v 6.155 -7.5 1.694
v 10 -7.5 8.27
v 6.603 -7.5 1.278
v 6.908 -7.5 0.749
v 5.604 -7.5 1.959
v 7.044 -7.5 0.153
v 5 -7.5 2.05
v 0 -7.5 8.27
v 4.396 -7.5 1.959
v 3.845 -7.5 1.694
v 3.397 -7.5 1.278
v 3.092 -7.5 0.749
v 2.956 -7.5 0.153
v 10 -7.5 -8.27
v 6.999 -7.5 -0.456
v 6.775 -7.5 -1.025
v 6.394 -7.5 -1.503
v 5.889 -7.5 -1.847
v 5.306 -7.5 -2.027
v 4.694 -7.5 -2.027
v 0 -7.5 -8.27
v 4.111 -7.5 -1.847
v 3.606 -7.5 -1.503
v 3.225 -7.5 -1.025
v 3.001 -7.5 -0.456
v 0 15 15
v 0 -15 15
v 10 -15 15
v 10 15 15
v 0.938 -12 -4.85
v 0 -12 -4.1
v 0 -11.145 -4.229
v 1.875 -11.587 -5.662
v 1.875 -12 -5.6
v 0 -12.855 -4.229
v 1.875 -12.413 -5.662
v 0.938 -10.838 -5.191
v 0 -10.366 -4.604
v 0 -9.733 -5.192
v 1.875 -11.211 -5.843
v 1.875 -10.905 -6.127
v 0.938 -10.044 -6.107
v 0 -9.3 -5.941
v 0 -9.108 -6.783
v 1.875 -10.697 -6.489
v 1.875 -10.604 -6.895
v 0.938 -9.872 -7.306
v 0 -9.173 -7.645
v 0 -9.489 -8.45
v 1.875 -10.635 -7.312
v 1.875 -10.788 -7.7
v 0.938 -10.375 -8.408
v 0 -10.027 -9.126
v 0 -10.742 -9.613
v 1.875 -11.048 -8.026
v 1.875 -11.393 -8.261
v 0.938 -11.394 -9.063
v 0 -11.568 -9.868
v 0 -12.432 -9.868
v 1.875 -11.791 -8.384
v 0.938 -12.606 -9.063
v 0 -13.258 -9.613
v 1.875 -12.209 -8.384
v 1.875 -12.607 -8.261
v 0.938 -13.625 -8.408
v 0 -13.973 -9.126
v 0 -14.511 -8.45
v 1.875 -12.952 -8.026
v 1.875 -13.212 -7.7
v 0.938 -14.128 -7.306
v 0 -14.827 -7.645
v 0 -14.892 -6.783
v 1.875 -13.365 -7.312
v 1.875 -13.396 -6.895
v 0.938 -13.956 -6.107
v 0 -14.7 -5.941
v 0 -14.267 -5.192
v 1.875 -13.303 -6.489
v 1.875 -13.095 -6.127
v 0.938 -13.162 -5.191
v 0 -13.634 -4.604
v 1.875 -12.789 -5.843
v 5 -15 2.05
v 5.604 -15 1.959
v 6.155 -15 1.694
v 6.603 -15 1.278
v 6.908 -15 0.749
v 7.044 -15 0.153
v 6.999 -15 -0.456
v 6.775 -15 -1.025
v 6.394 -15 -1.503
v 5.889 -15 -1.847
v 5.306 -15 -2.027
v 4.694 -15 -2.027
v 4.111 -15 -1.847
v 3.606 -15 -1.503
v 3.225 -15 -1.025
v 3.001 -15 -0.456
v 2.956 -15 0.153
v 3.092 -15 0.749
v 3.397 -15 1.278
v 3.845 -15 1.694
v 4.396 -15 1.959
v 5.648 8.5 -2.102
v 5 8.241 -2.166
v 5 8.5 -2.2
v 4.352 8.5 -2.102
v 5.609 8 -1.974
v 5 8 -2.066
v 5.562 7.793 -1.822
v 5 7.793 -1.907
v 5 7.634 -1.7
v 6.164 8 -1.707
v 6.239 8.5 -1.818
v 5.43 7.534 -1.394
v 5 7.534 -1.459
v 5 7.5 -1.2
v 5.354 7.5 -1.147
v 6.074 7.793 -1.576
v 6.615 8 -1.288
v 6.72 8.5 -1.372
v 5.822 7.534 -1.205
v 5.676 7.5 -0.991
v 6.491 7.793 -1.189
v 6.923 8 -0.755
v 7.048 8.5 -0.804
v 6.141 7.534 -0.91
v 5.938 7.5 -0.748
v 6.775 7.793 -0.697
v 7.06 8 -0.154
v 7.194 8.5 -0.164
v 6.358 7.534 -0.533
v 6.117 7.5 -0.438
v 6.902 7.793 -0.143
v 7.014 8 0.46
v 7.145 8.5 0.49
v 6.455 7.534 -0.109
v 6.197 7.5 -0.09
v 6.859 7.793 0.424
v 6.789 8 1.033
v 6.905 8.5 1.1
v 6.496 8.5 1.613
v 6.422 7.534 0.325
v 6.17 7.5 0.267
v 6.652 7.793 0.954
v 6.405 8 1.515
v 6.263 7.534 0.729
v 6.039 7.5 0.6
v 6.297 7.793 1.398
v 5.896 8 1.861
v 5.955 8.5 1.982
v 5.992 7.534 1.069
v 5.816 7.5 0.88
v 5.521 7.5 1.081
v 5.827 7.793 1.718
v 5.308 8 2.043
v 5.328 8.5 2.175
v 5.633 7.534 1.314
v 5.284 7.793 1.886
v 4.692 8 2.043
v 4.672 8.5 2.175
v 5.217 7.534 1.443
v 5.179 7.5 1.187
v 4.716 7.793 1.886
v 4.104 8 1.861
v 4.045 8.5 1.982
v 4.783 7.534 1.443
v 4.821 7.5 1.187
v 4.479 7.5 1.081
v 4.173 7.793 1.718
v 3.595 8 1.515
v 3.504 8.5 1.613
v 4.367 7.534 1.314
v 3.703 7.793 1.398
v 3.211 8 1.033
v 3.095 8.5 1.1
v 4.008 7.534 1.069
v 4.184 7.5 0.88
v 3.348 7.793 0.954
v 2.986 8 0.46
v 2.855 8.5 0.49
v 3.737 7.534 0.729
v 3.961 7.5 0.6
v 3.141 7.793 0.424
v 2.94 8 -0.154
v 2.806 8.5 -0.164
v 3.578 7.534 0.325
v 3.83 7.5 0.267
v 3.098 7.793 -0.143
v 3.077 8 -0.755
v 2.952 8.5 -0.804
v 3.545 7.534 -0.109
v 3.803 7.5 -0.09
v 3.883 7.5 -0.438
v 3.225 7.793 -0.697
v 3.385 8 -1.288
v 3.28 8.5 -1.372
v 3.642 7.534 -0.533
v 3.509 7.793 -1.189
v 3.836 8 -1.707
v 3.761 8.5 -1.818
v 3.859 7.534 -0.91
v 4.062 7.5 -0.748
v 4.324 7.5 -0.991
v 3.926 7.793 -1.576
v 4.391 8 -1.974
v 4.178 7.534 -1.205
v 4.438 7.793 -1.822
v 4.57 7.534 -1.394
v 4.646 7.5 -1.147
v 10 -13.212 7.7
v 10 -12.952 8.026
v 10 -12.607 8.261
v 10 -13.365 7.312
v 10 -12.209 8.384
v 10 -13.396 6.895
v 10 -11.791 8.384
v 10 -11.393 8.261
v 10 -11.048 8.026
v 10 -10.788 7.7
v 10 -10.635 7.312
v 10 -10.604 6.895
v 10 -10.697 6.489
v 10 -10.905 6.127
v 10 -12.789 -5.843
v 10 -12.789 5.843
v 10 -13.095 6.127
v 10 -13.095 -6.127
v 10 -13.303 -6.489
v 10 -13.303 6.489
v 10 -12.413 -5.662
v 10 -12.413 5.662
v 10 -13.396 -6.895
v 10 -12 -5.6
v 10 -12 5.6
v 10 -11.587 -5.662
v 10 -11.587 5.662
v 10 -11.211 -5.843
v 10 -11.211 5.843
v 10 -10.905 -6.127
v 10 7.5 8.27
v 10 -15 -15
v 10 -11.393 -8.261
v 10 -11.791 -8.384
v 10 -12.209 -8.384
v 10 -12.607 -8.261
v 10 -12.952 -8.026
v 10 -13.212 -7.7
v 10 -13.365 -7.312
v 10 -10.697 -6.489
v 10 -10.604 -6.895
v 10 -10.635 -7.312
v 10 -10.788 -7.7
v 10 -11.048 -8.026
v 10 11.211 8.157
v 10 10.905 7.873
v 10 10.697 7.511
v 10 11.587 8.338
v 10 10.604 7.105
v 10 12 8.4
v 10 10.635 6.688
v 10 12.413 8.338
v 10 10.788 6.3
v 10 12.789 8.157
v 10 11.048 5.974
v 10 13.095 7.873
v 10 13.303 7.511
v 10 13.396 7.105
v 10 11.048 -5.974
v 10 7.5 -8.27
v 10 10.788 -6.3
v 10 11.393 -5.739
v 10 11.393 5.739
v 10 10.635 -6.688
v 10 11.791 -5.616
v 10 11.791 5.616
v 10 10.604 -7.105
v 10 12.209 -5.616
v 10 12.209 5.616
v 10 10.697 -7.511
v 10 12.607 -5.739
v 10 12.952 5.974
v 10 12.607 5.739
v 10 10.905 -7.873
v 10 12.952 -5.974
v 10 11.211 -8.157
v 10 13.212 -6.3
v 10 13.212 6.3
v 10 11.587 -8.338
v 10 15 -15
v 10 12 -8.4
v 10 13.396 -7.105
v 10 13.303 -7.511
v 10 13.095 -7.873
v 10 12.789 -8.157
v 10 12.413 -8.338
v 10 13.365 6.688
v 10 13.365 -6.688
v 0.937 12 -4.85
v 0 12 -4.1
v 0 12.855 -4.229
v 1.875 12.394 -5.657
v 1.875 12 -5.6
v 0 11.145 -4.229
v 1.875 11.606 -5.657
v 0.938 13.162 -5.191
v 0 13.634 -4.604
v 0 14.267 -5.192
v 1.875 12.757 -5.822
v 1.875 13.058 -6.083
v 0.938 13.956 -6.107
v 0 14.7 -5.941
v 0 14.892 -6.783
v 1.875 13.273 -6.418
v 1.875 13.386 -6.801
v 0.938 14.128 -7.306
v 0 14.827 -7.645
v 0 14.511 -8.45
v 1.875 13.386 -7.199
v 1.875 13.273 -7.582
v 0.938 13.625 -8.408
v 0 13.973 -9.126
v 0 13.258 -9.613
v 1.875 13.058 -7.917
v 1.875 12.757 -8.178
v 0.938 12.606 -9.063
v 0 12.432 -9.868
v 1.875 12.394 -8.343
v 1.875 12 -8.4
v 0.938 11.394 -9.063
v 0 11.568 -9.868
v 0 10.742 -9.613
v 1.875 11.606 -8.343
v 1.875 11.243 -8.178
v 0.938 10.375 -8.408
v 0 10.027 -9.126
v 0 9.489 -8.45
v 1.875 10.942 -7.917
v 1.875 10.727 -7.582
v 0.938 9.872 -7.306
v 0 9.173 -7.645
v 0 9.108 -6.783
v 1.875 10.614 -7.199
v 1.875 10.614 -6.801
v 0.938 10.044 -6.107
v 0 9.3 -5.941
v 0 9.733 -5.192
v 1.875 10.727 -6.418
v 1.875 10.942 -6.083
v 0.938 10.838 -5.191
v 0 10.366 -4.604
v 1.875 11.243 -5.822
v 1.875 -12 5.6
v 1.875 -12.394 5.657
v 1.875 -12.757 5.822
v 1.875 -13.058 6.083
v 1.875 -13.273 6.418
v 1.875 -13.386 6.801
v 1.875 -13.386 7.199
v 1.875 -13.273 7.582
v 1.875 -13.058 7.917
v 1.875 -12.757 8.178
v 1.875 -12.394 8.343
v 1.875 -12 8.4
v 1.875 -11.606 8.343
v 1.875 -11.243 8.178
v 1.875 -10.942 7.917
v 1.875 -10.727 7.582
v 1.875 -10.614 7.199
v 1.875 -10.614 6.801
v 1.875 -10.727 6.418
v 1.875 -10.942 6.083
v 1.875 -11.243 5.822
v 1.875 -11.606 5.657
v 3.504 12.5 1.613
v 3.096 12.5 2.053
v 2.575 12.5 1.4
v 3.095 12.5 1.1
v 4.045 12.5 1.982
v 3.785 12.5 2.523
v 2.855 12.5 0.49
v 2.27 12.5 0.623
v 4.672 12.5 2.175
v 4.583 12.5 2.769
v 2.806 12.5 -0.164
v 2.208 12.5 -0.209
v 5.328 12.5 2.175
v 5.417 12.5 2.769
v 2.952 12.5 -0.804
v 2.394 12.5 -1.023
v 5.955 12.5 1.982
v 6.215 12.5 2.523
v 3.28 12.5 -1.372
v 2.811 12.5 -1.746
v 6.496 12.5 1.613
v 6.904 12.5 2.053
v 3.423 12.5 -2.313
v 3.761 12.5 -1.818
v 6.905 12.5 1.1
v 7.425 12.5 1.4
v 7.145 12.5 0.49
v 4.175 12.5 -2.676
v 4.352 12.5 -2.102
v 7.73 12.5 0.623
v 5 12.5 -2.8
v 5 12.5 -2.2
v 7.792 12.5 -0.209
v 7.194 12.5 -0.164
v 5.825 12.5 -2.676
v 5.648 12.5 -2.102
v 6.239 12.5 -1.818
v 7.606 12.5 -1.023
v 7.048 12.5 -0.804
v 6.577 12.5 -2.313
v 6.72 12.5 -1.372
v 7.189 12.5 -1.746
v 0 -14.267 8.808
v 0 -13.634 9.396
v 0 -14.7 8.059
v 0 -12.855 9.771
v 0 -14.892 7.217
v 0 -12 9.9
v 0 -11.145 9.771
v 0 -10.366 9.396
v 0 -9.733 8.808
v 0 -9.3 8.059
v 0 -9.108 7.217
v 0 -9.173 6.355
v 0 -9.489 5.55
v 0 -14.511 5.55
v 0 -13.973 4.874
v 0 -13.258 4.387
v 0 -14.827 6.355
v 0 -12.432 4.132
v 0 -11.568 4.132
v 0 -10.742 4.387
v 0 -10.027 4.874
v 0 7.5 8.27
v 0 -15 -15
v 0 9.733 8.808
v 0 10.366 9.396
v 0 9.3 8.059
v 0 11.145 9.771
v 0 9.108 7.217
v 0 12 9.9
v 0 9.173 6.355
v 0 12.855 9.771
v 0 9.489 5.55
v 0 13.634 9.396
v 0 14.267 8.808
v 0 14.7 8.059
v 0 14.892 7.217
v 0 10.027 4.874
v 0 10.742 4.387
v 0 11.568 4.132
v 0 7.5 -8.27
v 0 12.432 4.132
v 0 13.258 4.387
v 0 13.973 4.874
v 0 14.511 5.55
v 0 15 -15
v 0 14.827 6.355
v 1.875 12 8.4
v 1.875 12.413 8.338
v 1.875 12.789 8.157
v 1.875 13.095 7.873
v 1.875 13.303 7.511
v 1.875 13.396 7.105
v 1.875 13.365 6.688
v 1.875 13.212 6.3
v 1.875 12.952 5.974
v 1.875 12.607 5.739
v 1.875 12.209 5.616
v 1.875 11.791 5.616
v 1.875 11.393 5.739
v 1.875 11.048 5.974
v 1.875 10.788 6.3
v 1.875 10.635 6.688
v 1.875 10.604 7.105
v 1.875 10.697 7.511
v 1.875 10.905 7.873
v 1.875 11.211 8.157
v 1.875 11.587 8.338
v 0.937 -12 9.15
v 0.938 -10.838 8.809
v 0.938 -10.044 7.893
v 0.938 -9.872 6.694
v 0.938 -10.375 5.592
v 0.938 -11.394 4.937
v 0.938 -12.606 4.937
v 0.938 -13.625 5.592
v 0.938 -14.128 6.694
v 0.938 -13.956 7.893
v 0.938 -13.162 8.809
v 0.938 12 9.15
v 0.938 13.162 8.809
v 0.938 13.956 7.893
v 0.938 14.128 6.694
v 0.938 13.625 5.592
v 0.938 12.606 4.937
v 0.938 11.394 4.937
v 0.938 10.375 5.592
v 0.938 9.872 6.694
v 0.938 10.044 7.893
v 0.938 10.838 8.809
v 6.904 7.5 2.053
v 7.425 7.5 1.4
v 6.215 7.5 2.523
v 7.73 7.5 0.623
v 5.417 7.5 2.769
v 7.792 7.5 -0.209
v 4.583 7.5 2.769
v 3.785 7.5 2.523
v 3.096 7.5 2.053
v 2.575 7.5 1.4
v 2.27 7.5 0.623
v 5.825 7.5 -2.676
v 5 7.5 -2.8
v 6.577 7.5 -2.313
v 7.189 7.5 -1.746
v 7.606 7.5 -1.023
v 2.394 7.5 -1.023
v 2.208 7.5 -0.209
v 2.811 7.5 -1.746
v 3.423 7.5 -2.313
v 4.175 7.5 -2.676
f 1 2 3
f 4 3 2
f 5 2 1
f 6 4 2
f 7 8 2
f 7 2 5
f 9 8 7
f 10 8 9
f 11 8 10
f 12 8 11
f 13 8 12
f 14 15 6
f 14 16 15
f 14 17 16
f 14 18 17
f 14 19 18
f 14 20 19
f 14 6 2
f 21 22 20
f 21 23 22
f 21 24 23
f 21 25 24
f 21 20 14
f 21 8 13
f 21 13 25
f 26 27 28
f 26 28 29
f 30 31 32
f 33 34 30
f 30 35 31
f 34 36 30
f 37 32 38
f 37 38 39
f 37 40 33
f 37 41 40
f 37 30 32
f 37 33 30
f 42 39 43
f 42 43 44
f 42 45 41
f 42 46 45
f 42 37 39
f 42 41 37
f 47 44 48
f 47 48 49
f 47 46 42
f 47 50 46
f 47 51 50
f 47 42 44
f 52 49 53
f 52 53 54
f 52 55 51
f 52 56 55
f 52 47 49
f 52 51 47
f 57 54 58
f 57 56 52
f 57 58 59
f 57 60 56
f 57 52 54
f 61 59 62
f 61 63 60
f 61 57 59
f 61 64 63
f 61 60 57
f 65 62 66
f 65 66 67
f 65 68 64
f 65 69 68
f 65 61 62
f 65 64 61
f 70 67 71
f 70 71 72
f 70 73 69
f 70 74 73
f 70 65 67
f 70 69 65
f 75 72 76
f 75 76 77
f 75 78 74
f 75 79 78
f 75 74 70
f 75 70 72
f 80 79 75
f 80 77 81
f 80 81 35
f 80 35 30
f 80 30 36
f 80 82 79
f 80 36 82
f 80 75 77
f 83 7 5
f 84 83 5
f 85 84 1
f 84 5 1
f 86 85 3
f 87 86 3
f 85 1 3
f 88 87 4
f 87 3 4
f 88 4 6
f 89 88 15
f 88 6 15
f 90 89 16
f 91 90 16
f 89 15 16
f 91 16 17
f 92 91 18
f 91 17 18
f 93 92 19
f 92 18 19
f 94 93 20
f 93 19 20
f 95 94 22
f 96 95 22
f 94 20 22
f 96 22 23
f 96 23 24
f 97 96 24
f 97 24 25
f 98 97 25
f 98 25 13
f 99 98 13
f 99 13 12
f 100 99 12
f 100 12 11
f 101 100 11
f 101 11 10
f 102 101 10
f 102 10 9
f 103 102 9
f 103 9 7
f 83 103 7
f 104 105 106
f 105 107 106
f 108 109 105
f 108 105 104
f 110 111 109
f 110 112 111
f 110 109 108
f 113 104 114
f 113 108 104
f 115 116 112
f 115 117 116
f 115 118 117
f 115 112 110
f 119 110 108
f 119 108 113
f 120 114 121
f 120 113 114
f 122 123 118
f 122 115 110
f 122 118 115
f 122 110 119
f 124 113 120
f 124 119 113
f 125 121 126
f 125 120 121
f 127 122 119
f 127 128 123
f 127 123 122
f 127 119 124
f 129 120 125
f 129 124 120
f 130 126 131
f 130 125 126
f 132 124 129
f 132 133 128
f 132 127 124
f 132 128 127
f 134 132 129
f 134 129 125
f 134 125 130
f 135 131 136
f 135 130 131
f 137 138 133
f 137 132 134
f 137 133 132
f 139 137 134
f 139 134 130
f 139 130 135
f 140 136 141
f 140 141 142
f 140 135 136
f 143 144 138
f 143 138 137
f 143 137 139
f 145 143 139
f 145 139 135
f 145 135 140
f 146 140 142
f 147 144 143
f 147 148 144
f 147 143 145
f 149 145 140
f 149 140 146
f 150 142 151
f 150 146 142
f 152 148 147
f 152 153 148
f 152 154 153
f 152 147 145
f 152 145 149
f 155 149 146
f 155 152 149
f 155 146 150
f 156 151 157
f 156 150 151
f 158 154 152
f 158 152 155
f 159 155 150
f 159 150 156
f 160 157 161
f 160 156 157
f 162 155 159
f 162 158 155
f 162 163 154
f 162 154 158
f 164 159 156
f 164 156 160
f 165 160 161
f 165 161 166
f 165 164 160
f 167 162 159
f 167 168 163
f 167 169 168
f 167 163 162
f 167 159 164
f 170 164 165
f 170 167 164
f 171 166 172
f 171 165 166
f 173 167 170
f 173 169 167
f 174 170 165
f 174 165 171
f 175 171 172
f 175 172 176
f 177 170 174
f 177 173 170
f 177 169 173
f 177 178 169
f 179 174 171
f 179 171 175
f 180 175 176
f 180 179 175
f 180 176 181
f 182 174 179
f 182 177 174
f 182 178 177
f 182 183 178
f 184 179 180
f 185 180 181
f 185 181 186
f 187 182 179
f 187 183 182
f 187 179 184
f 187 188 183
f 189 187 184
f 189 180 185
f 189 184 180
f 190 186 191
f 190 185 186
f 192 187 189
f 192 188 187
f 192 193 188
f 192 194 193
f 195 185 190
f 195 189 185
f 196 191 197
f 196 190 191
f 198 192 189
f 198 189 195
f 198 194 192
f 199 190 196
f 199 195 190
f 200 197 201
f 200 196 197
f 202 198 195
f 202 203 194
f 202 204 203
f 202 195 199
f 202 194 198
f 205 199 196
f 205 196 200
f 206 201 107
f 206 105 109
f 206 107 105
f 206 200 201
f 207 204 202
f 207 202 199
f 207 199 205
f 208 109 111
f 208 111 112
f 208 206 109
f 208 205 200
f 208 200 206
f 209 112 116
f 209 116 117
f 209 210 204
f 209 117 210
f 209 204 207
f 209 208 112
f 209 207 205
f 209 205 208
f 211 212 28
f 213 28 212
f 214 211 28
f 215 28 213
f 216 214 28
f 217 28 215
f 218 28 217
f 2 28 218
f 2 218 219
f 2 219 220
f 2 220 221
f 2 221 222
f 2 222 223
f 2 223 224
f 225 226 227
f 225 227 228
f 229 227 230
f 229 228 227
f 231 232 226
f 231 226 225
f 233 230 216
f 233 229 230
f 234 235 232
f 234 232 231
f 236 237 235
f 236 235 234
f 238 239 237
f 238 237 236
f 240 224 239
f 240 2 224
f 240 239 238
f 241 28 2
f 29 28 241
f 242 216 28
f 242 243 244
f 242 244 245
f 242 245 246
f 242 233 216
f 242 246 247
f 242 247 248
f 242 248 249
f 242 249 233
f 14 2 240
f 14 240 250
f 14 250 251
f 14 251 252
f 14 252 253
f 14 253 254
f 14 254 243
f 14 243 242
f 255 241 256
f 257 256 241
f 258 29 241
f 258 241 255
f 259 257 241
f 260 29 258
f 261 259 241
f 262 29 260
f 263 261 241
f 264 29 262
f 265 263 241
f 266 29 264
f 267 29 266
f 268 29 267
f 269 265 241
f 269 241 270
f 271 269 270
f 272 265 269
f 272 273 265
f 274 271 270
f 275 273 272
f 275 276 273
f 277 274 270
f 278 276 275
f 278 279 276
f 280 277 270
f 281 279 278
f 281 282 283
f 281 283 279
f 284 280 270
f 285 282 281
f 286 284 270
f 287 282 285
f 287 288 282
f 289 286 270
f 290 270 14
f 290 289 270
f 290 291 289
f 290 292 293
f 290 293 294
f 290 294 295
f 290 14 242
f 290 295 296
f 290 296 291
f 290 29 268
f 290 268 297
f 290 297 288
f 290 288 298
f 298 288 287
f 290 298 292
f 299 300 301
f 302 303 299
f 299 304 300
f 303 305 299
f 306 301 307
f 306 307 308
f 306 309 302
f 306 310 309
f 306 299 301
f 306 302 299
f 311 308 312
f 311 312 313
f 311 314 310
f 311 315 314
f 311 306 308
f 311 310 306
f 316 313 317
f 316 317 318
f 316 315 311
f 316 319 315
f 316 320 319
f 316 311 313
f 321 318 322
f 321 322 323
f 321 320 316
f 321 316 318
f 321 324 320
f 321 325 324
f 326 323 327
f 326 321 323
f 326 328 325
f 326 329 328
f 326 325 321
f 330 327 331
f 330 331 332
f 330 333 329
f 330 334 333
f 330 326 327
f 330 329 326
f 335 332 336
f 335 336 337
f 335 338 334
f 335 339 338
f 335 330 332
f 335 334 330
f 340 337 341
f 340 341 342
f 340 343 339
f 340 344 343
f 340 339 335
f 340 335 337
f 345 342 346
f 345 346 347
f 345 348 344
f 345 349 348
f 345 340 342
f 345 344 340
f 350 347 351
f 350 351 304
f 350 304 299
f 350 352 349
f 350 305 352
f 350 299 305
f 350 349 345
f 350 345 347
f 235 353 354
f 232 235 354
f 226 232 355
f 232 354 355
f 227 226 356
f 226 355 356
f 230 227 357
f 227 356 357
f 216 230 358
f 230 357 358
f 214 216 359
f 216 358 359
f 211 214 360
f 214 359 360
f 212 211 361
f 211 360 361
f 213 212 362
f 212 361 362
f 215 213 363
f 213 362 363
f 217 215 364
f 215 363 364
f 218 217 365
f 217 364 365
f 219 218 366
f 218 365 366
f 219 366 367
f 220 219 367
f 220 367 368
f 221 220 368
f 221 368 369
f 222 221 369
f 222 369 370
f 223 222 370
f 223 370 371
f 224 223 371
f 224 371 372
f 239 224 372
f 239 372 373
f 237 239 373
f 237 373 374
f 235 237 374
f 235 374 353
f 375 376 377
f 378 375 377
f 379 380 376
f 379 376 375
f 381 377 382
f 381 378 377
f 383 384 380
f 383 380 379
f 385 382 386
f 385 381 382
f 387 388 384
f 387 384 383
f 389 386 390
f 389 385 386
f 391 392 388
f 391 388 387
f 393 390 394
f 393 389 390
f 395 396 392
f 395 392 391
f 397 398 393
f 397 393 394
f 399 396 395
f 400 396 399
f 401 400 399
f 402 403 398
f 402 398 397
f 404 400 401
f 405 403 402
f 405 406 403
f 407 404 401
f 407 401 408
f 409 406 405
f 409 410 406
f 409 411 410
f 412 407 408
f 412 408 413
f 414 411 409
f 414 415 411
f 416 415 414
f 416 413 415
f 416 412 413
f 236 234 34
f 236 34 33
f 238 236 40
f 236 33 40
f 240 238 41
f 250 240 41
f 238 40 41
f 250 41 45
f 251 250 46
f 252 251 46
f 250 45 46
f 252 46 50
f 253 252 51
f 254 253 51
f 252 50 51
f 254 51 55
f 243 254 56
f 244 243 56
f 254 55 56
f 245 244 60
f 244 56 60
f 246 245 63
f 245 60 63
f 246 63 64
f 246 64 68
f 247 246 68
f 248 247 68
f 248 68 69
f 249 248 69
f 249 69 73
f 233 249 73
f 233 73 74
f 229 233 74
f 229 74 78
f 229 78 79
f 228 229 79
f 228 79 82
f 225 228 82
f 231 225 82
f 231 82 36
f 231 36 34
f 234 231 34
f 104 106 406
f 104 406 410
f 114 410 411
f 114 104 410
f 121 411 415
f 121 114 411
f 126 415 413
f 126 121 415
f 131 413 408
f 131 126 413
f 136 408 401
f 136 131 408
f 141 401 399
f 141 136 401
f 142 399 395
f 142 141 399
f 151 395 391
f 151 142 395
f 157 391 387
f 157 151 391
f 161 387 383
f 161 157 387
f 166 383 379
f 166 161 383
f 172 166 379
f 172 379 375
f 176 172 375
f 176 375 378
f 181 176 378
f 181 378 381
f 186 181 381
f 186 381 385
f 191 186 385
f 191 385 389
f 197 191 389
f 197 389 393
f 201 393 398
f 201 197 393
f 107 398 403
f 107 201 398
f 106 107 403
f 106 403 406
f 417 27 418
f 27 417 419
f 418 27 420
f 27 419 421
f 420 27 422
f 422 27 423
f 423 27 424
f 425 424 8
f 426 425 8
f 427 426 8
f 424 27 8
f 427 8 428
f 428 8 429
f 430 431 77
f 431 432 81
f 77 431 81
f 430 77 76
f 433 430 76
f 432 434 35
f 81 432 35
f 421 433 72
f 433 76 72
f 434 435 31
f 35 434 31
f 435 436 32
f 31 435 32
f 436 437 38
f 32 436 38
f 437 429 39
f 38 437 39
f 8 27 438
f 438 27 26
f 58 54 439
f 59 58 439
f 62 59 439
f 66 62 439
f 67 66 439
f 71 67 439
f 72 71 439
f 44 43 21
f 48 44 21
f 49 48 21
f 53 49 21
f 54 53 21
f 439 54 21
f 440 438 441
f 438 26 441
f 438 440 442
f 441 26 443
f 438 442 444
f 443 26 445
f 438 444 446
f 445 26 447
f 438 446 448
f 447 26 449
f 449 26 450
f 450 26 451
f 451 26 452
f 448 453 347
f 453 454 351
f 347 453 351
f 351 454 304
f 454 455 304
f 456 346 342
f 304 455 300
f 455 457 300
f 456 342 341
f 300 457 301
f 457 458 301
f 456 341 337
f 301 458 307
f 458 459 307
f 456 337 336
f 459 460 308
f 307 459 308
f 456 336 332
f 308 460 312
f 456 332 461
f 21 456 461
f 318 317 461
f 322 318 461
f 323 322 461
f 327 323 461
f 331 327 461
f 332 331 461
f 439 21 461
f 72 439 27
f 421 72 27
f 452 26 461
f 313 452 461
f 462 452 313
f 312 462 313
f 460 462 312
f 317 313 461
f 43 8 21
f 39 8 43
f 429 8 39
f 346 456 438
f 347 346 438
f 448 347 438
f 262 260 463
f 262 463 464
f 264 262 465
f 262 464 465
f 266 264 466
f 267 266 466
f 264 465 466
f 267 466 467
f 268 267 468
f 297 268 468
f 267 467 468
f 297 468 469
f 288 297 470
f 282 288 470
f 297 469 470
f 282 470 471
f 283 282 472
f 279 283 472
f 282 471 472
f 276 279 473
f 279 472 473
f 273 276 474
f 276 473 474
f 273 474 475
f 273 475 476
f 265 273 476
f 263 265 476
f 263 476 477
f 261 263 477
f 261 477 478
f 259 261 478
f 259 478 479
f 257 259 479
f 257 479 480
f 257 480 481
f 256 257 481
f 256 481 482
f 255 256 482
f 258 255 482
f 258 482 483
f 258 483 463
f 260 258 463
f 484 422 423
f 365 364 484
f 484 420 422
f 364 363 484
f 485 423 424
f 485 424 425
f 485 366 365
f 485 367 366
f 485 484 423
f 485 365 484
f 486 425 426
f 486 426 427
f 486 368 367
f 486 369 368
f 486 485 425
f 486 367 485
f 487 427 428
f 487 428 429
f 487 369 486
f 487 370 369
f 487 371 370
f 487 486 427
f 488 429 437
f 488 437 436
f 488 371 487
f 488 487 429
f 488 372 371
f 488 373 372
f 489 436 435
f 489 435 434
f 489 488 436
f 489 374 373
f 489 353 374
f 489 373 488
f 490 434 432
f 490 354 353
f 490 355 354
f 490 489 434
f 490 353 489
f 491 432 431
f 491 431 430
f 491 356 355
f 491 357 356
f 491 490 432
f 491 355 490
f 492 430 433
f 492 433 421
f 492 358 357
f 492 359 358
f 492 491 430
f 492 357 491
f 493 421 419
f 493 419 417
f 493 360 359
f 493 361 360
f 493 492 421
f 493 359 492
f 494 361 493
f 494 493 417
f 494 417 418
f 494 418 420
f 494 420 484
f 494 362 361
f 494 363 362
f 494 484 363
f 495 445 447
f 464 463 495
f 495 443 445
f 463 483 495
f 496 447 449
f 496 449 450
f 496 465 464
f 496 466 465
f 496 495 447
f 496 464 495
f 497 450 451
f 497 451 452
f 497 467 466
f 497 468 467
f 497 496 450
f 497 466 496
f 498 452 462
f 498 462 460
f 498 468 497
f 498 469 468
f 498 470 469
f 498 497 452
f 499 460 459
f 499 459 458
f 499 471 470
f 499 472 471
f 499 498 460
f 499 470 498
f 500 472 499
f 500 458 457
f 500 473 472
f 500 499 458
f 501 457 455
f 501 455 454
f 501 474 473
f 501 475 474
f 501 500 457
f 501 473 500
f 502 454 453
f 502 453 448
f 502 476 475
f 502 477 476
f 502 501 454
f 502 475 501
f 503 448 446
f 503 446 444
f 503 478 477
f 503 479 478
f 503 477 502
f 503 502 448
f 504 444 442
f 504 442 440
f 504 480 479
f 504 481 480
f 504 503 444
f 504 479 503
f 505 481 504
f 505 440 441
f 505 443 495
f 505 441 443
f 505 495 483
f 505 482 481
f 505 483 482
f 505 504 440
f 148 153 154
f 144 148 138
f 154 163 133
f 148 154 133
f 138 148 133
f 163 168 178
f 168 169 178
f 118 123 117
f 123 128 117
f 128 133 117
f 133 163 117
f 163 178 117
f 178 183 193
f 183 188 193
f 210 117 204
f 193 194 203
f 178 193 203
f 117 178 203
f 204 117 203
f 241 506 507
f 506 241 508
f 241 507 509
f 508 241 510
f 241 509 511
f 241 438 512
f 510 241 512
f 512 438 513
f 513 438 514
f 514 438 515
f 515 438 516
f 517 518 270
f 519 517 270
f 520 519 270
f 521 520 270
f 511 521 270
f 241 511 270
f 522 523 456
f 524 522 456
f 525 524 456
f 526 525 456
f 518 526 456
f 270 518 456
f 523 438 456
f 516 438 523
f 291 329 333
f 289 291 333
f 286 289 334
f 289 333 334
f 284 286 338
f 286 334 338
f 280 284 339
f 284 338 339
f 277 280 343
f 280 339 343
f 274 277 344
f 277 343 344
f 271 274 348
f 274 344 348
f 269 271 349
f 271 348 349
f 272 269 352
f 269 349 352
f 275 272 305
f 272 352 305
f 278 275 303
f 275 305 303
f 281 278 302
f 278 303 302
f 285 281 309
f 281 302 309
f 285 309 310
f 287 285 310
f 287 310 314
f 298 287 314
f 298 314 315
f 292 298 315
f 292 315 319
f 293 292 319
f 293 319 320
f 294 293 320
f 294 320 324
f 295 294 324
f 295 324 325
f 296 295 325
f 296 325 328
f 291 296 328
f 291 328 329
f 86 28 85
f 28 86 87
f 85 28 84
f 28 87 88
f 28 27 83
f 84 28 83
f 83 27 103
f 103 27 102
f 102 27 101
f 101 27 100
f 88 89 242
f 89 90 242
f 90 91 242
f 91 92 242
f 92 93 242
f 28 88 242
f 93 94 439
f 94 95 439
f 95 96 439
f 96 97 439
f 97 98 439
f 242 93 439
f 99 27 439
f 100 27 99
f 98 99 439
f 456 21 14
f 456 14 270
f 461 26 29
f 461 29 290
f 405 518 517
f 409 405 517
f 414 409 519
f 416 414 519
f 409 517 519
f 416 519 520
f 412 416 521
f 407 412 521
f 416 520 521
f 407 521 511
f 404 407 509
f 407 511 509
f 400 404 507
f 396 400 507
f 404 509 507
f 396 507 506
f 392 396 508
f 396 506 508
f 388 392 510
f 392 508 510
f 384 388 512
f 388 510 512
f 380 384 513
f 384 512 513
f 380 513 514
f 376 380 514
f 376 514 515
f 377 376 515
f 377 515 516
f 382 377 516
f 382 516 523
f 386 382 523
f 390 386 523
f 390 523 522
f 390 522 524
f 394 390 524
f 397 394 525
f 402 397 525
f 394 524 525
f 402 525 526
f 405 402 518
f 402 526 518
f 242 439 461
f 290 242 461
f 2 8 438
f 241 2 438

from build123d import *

# Parameters (mm, degrees)
SKETCH_1_W          = 30
SKETCH_1_H          = 30
SKETCH_1_W_2        = 16.540501684
SKETCH_1_H_2        = 15
EXTRUDE_1_DEPTH     = 10
SKETCH_4_R          = 1.4
CUT_EXTRUDE_3_DEPTH = 24.452078799
SKETCH_8_R          = 2.9
CUT_EXTRUDE_6_DEPTH = 2
CHAMFER_1_SIZE      = 2
CHAMFER_1_SIZE_2    = 1.6
SKETCH_5_R          = 2.05
CUT_EXTRUDE_7_DEPTH = 20
SKETCH_9_R          = 2.8
SKETCH_9_R_2        = 2.2
CUT_EXTRUDE_8_DEPTH = 5
FILLET_1_R          = 1


with BuildPart() as part:
    # 스케치1 → 보스-돌출1 (new body)
    with BuildSketch(Plane(origin=(0, 0, 0), x_dir=(0, 0, -1), z_dir=(1, 0, 0))):
        Rectangle(SKETCH_1_W, SKETCH_1_H)
        Rectangle(SKETCH_1_W_2, SKETCH_1_H_2, mode=Mode.SUBTRACT)
    extrude(amount=EXTRUDE_1_DEPTH)

    # 스케치4 → 컷-돌출3 (cut, through all)
    with BuildSketch(Plane(origin=(0, 0, 0), x_dir=(0, 0, -1), z_dir=(1, 0, 0))):
        with Locations((-7, -12)):
            Circle(SKETCH_4_R)
        with Locations(Location((-7, 12, 0), (0, 0, 180))):
            Circle(SKETCH_4_R)
        with Locations(Location((7, -12, 0), (0, 0, 180))):
            Circle(SKETCH_4_R)
        with Locations((7, 12)):
            Circle(SKETCH_4_R)
    extrude(amount=CUT_EXTRUDE_3_DEPTH, mode=Mode.SUBTRACT)

    # 스케치8 → 컷-돌출6 (cut)
    with BuildSketch(Plane.ZY):
        with Locations((-7, 12)):
            Circle(SKETCH_8_R)
        with Locations((7, 12)):
            Circle(SKETCH_8_R)
        with Locations((-7, -12)):
            Circle(SKETCH_8_R)
        with Locations((7, -12)):
            Circle(SKETCH_8_R)
    extrude(amount=-CUT_EXTRUDE_6_DEPTH, mode=Mode.SUBTRACT)

    # 모따기1
    # the kernel refuses this chamfer: 2, 1.6 mm, written as the material it adds along each edge
    with BuildSketch(Plane(origin=(2, -12, 7), x_dir=(0, 0, 1), z_dir=(0, -1, 0))) as chamfer_1_piece_1_section:
        Polygon((2.9, CHAMFER_1_SIZE), (2.9 - CHAMFER_1_SIZE_2, 0), (2.9, 0), align=None)
    chamfer_1_piece_1 = revolve(axis=Axis((2, -12, 7), (-1, 0, 0)), mode=Mode.PRIVATE)
    chamfer_1_piece_1 = split(chamfer_1_piece_1, bisect_by=Plane(origin=(0, -12, 4.826759692), z_dir=(1, 0, 0)), keep=Keep.TOP, mode=Mode.PRIVATE)
    chamfer_1_piece_1 = chamfer_1_piece_1 - Plane(origin=(0.956092246, -12, 7), x_dir=(0, 0, -1), z_dir=(-1, 0, 0)) * Cylinder(1.4, 12, mode=Mode.PRIVATE)
    add(chamfer_1_piece_1)
    with BuildSketch(Plane(origin=(2, 12, 7), x_dir=(0, 0, 1), z_dir=(0, -1, 0))) as chamfer_1_piece_2_section:
        Polygon((2.9, CHAMFER_1_SIZE), (2.9 - CHAMFER_1_SIZE_2, 0), (2.9, 0), align=None)
    chamfer_1_piece_2 = revolve(axis=Axis((2, 12, 7), (-1, 0, 0)), mode=Mode.PRIVATE)
    chamfer_1_piece_2 = split(chamfer_1_piece_2, bisect_by=Plane(origin=(0, 12, 4.826759692), z_dir=(1, 0, 0)), keep=Keep.TOP, mode=Mode.PRIVATE)
    chamfer_1_piece_2 = chamfer_1_piece_2 - Plane(origin=(0.956092246, 12, 7), x_dir=(0, 0, 1), z_dir=(-1, 0, 0)) * Cylinder(1.4, 12, mode=Mode.PRIVATE)
    add(chamfer_1_piece_2)
    with BuildSketch(Plane(origin=(2, 12, -7), x_dir=(0, 0, 1), z_dir=(0, -1, 0))) as chamfer_1_piece_3_section:
        Polygon((2.9, CHAMFER_1_SIZE), (2.9 - CHAMFER_1_SIZE_2, 0), (2.9, 0), align=None)
    chamfer_1_piece_3 = revolve(axis=Axis((2, 12, -7), (-1, 0, 0)), mode=Mode.PRIVATE)
    chamfer_1_piece_3 = split(chamfer_1_piece_3, bisect_by=Plane(origin=(0, 12, -9.173240308), z_dir=(1, 0, 0)), keep=Keep.TOP, mode=Mode.PRIVATE)
    chamfer_1_piece_3 = chamfer_1_piece_3 - Plane(origin=(0.956092246, 12, -7), x_dir=(0, 0, -1), z_dir=(-1, 0, 0)) * Cylinder(1.4, 12, mode=Mode.PRIVATE)
    add(chamfer_1_piece_3)
    with BuildSketch(Plane(origin=(2, -12, -7), x_dir=(0, 0, 1), z_dir=(0, -1, 0))) as chamfer_1_piece_4_section:
        Polygon((2.9, CHAMFER_1_SIZE), (2.9 - CHAMFER_1_SIZE_2, 0), (2.9, 0), align=None)
    chamfer_1_piece_4 = revolve(axis=Axis((2, -12, -7), (-1, 0, 0)), mode=Mode.PRIVATE)
    chamfer_1_piece_4 = split(chamfer_1_piece_4, bisect_by=Plane(origin=(0, -12, -9.173240308), z_dir=(1, 0, 0)), keep=Keep.TOP, mode=Mode.PRIVATE)
    chamfer_1_piece_4 = chamfer_1_piece_4 - Plane(origin=(0.956092246, -12, -7), x_dir=(0, 0, 1), z_dir=(-1, 0, 0)) * Cylinder(1.4, 12, mode=Mode.PRIVATE)
    add(chamfer_1_piece_4)

    # 스케치5 → 컷-돌출7 (cut)
    with BuildSketch(Plane(origin=(0, 0, 0), x_dir=(1, 0, 0), z_dir=(0, 1, 0))):
        with Locations(Location((5, 0, 0), (0, 0, 270))):
            Circle(SKETCH_5_R)
    extrude(amount=-CUT_EXTRUDE_7_DEPTH, mode=Mode.SUBTRACT)

    # 스케치9 → 컷-돌출8 (cut)
    with BuildSketch(Plane.XZ.offset(-7.5)):
        with Locations(Location((5, 0, 0), (0, 0, 270))):
            Circle(SKETCH_9_R)
        with Locations(Location((5, 0, 0), (0, 0, 270))):
            Circle(SKETCH_9_R_2, mode=Mode.SUBTRACT)
    extrude(amount=-CUT_EXTRUDE_8_DEPTH, mode=Mode.SUBTRACT)

    # 필렛1
    fillet_1_edges = [part.edges().sort_by_distance(p)[0] for p in [
        (5, 7.5, 2.2),
    ]]
    fillet(fillet_1_edges, radius=FILLET_1_R)


solid = part.part
